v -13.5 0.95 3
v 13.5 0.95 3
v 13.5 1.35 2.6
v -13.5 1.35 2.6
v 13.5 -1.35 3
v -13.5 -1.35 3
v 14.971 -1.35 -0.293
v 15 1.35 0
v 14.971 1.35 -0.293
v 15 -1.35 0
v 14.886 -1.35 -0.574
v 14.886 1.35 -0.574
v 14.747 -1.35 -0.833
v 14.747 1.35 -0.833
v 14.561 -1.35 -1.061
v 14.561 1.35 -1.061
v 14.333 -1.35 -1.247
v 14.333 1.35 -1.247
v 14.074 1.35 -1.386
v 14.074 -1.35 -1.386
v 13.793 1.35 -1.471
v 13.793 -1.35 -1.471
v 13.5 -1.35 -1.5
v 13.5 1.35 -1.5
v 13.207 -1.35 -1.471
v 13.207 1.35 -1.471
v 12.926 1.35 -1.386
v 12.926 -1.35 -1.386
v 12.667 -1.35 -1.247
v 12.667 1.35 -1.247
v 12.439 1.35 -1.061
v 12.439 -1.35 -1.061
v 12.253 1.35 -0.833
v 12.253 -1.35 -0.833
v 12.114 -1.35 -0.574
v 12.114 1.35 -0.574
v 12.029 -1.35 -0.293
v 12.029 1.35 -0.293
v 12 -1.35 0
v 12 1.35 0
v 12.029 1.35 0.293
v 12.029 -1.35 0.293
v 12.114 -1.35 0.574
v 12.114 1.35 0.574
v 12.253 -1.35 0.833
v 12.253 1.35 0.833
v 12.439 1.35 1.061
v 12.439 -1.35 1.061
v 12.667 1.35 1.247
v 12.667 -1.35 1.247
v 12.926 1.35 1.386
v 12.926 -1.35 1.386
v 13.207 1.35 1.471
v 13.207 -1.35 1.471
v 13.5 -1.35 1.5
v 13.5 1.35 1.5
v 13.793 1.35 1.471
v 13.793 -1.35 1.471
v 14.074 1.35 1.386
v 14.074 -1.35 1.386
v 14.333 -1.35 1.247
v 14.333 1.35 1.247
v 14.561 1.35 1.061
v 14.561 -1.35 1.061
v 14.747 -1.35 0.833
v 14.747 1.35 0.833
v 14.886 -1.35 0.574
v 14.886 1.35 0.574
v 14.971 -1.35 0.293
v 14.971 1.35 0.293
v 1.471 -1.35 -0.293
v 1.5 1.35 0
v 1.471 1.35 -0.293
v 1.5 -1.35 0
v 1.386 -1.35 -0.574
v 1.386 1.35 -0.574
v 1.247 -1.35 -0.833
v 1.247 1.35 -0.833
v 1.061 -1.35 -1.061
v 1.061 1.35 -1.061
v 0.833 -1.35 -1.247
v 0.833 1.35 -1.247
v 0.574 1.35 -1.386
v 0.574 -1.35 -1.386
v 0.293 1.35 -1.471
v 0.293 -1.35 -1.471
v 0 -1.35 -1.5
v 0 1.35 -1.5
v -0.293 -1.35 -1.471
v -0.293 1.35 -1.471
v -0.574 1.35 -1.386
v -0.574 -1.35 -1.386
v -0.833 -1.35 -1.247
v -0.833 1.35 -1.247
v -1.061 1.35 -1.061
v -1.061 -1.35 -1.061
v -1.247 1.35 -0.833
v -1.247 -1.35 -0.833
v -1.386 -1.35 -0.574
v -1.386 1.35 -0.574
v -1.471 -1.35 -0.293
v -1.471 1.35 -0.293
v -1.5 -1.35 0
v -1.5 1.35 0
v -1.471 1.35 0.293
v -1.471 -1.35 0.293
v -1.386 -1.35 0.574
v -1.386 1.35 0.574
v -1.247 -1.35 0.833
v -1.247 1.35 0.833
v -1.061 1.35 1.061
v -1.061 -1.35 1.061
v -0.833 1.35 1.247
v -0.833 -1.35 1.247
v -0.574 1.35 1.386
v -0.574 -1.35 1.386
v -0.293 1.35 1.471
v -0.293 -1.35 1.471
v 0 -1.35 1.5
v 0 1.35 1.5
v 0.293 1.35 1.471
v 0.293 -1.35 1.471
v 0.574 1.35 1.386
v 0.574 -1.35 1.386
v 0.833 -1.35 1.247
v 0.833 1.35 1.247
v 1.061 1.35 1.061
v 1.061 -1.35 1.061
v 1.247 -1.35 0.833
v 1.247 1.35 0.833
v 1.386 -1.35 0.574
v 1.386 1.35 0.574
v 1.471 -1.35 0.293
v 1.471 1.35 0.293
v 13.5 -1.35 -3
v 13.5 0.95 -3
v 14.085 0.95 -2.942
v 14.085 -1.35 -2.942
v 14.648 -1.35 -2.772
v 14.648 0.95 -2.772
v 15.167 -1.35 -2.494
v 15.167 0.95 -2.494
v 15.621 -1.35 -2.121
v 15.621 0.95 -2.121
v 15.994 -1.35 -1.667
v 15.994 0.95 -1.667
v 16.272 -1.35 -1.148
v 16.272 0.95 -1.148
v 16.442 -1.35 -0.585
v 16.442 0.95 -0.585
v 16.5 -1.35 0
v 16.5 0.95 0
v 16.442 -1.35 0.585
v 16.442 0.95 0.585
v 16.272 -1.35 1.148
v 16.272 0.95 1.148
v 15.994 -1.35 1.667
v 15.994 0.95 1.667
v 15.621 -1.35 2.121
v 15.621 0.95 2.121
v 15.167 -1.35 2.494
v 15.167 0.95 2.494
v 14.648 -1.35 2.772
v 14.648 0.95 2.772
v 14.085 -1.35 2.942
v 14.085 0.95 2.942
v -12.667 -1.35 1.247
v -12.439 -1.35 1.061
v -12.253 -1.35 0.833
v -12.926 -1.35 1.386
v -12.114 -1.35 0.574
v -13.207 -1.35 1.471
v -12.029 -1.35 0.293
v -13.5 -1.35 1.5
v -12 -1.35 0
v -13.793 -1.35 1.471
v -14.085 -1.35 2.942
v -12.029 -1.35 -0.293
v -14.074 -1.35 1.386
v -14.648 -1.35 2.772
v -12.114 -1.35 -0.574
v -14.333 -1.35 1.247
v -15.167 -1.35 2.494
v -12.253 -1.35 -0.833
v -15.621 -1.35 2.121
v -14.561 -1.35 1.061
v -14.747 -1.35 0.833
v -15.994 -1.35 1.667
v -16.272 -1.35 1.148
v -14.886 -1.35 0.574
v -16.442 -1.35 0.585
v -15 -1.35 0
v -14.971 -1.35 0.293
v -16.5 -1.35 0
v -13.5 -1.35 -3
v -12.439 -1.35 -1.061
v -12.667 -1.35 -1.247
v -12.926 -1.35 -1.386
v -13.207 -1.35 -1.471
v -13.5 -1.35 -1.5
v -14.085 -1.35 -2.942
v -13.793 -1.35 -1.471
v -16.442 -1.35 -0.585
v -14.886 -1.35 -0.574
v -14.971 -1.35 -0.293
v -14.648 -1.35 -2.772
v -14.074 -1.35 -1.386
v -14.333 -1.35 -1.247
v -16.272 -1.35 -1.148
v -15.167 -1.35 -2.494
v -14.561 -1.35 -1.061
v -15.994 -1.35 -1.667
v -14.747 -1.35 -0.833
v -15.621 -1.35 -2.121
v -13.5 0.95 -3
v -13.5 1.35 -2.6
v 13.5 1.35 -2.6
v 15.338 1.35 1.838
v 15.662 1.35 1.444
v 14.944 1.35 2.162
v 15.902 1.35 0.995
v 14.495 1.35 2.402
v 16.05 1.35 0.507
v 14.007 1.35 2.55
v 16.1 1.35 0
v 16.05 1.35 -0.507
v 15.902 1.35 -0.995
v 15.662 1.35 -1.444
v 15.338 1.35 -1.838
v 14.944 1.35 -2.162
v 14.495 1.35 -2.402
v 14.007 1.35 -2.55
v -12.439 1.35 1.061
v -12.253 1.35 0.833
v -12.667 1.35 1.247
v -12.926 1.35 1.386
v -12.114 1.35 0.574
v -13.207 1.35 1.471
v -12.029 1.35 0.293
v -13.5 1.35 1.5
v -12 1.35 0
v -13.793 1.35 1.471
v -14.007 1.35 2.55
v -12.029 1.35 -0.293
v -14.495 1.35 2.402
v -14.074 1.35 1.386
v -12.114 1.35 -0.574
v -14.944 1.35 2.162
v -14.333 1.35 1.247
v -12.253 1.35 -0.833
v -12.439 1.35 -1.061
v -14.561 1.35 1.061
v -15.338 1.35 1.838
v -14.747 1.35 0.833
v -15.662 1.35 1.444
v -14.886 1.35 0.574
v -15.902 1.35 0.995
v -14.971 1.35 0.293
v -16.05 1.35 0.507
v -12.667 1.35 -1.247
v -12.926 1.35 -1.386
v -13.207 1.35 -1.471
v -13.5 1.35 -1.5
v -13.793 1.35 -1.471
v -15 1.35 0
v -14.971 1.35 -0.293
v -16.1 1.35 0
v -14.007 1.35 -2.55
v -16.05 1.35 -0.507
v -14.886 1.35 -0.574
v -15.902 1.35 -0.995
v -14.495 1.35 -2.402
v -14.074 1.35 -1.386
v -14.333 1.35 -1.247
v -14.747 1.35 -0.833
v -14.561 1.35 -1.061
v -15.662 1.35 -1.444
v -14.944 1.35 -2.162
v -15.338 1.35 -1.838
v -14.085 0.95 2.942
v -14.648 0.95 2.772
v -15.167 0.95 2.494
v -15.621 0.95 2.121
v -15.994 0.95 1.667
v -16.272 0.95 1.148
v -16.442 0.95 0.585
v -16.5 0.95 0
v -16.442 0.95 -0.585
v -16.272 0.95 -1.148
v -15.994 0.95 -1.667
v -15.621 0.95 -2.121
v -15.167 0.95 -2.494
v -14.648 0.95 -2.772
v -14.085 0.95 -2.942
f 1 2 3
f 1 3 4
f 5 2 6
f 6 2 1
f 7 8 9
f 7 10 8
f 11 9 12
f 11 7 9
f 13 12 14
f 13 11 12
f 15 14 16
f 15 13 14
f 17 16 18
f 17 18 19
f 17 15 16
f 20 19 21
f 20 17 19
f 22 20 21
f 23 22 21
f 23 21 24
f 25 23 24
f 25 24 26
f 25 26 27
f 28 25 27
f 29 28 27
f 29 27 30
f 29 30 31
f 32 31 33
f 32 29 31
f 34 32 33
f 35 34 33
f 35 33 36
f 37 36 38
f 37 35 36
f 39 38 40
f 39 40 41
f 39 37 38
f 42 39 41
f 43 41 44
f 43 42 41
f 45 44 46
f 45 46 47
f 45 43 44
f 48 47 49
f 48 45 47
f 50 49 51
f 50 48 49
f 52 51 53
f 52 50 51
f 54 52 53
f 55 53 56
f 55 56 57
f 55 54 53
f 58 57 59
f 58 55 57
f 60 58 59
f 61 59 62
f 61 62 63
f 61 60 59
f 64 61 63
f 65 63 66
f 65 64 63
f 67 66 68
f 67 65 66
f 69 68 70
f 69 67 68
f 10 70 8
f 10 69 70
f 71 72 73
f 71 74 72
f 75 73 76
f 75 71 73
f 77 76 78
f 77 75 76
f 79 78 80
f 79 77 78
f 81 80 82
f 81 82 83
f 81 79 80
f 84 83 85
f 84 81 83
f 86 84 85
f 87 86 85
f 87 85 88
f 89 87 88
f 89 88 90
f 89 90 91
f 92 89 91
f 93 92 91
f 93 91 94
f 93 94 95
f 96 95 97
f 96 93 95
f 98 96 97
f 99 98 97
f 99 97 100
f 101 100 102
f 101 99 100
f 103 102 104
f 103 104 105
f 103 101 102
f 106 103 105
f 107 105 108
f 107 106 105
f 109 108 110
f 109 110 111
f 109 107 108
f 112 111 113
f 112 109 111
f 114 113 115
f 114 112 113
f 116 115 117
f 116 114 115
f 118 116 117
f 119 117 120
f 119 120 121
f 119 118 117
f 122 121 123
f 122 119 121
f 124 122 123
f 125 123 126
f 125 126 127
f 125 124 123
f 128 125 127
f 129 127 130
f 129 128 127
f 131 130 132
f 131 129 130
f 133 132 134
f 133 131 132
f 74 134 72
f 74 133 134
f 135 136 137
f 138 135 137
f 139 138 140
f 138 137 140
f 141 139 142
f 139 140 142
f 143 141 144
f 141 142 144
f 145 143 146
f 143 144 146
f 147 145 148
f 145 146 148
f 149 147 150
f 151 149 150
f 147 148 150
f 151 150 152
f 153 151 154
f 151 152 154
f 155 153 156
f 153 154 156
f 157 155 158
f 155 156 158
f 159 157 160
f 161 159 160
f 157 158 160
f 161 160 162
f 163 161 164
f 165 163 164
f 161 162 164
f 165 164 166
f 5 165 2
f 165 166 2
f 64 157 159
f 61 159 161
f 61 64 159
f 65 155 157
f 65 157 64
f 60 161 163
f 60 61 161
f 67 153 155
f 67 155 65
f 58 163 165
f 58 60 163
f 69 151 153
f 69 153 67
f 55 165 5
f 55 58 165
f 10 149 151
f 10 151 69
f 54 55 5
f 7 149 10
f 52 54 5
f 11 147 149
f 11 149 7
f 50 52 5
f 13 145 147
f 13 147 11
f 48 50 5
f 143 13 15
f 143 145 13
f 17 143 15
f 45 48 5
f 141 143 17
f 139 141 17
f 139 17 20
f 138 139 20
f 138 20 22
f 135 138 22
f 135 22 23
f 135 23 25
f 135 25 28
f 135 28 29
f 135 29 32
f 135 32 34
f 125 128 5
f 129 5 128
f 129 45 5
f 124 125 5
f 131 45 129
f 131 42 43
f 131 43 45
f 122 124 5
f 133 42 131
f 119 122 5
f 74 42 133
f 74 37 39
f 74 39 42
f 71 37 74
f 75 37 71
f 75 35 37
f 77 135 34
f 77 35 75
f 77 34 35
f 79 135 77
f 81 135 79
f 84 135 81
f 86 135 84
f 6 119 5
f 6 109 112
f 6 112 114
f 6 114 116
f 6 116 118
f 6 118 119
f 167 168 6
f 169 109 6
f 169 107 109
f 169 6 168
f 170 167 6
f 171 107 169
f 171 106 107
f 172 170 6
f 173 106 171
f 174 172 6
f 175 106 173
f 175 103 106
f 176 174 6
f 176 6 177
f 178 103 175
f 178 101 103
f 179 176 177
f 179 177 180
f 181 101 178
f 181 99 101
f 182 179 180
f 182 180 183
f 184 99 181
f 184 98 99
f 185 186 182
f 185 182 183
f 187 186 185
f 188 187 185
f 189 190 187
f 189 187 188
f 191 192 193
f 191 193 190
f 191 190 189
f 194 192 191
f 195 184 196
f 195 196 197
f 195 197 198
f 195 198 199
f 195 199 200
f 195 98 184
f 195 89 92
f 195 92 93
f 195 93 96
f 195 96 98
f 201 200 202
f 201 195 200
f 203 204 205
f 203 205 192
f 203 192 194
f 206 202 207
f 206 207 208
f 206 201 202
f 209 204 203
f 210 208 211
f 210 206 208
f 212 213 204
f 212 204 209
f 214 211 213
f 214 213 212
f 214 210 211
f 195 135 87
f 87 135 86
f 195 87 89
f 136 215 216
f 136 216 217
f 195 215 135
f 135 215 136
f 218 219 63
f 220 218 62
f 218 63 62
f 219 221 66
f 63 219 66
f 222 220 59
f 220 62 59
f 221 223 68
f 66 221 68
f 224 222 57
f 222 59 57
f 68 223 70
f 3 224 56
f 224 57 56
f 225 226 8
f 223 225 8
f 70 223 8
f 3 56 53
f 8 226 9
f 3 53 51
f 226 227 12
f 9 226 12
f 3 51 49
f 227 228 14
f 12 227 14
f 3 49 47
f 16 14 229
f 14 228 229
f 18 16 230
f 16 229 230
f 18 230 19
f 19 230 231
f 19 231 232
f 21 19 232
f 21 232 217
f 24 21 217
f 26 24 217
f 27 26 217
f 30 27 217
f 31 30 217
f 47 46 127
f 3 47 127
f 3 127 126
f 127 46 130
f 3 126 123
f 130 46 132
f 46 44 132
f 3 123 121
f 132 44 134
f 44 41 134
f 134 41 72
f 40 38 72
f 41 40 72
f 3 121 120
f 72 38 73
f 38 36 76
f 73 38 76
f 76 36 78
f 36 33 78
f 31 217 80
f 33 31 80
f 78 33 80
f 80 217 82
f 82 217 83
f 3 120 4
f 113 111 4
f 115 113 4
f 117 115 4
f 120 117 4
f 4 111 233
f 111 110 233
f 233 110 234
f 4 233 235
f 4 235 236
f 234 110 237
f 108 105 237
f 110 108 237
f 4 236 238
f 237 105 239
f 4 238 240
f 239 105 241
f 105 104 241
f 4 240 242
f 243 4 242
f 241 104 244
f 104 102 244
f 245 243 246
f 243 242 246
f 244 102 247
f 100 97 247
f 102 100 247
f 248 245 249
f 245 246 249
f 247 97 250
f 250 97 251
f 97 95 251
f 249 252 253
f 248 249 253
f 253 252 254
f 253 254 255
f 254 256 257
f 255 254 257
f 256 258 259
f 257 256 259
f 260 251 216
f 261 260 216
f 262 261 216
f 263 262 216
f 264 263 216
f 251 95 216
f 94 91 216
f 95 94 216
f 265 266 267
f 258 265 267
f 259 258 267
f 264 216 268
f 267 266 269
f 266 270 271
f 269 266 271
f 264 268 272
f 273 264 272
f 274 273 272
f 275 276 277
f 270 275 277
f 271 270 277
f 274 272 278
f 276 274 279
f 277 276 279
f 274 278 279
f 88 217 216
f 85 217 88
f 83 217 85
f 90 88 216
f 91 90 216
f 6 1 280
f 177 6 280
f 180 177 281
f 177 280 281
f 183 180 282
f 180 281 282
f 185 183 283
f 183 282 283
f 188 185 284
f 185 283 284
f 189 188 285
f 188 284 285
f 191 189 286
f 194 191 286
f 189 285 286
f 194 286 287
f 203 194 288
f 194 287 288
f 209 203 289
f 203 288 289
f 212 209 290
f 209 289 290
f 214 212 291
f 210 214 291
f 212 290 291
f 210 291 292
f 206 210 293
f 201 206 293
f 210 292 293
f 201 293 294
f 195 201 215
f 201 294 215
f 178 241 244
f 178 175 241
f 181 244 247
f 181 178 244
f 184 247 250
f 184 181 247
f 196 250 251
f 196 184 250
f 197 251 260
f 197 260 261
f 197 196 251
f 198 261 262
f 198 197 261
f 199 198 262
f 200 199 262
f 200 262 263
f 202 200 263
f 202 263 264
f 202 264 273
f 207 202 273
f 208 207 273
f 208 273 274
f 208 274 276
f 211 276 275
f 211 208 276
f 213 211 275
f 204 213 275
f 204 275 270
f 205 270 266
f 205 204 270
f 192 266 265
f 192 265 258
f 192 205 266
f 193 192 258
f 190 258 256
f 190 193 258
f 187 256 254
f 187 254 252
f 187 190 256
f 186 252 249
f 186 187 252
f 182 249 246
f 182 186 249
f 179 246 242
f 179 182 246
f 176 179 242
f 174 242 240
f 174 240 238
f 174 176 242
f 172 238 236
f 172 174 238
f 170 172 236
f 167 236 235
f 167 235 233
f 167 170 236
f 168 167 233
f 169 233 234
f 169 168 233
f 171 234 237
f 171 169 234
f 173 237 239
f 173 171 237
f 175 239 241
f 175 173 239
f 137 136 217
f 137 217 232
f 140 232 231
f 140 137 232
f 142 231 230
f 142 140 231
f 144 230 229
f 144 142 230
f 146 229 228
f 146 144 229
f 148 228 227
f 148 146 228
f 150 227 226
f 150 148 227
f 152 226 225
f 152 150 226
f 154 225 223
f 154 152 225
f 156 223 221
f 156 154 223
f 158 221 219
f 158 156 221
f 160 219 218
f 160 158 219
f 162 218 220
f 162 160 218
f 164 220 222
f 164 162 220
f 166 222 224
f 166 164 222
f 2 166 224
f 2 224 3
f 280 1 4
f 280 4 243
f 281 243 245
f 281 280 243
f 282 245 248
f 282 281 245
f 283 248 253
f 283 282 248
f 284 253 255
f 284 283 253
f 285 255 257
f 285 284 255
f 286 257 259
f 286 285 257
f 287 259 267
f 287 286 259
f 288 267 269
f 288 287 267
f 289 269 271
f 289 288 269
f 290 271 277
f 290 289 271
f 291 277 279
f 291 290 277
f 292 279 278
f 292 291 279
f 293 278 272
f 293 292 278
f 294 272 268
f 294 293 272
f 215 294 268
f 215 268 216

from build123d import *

# Parameters (mm, degrees)
SKETCH1_R           = 1.5
BOSS_EXTRUDE1_DEPTH = 1.35
CHAMFER1_SIZE       = 0.4


with BuildPart() as part:
    # Sketch1 → Boss-Extrude1 (new body, symmetric)
    with BuildSketch(Plane(origin=(0, 0, 0), x_dir=(1, 0, 0), z_dir=(0, 1, 0))):
        with BuildLine():
            Line((-13.5, 3), (13.5, 3))
            ThreePointArc((13.5, 3), (16.5, 0), (13.5, -3))
            Line((13.5, -3), (-13.5, -3))
            ThreePointArc((-13.5, -3), (-16.5, 0), (-13.5, 3))
        make_face()
        with Locations((-13.5, 0)):
            Circle(SKETCH1_R, mode=Mode.SUBTRACT)
        with Locations((13.5, 0)):
            Circle(SKETCH1_R, mode=Mode.SUBTRACT)
        Circle(SKETCH1_R, mode=Mode.SUBTRACT)
    extrude(amount=BOSS_EXTRUDE1_DEPTH, both=True)

    # Chamfer1
    chamfer1_edges = [part.edges().sort_by_distance(p)[0] for p in [
        (16.5, 1.35, 0),
        (0, 1.35, -3),
        (-16.5, 1.35, 0),
        (0, 1.35, 3),
    ]]
    chamfer(chamfer1_edges, length=CHAMFER1_SIZE)


solid = part.part
